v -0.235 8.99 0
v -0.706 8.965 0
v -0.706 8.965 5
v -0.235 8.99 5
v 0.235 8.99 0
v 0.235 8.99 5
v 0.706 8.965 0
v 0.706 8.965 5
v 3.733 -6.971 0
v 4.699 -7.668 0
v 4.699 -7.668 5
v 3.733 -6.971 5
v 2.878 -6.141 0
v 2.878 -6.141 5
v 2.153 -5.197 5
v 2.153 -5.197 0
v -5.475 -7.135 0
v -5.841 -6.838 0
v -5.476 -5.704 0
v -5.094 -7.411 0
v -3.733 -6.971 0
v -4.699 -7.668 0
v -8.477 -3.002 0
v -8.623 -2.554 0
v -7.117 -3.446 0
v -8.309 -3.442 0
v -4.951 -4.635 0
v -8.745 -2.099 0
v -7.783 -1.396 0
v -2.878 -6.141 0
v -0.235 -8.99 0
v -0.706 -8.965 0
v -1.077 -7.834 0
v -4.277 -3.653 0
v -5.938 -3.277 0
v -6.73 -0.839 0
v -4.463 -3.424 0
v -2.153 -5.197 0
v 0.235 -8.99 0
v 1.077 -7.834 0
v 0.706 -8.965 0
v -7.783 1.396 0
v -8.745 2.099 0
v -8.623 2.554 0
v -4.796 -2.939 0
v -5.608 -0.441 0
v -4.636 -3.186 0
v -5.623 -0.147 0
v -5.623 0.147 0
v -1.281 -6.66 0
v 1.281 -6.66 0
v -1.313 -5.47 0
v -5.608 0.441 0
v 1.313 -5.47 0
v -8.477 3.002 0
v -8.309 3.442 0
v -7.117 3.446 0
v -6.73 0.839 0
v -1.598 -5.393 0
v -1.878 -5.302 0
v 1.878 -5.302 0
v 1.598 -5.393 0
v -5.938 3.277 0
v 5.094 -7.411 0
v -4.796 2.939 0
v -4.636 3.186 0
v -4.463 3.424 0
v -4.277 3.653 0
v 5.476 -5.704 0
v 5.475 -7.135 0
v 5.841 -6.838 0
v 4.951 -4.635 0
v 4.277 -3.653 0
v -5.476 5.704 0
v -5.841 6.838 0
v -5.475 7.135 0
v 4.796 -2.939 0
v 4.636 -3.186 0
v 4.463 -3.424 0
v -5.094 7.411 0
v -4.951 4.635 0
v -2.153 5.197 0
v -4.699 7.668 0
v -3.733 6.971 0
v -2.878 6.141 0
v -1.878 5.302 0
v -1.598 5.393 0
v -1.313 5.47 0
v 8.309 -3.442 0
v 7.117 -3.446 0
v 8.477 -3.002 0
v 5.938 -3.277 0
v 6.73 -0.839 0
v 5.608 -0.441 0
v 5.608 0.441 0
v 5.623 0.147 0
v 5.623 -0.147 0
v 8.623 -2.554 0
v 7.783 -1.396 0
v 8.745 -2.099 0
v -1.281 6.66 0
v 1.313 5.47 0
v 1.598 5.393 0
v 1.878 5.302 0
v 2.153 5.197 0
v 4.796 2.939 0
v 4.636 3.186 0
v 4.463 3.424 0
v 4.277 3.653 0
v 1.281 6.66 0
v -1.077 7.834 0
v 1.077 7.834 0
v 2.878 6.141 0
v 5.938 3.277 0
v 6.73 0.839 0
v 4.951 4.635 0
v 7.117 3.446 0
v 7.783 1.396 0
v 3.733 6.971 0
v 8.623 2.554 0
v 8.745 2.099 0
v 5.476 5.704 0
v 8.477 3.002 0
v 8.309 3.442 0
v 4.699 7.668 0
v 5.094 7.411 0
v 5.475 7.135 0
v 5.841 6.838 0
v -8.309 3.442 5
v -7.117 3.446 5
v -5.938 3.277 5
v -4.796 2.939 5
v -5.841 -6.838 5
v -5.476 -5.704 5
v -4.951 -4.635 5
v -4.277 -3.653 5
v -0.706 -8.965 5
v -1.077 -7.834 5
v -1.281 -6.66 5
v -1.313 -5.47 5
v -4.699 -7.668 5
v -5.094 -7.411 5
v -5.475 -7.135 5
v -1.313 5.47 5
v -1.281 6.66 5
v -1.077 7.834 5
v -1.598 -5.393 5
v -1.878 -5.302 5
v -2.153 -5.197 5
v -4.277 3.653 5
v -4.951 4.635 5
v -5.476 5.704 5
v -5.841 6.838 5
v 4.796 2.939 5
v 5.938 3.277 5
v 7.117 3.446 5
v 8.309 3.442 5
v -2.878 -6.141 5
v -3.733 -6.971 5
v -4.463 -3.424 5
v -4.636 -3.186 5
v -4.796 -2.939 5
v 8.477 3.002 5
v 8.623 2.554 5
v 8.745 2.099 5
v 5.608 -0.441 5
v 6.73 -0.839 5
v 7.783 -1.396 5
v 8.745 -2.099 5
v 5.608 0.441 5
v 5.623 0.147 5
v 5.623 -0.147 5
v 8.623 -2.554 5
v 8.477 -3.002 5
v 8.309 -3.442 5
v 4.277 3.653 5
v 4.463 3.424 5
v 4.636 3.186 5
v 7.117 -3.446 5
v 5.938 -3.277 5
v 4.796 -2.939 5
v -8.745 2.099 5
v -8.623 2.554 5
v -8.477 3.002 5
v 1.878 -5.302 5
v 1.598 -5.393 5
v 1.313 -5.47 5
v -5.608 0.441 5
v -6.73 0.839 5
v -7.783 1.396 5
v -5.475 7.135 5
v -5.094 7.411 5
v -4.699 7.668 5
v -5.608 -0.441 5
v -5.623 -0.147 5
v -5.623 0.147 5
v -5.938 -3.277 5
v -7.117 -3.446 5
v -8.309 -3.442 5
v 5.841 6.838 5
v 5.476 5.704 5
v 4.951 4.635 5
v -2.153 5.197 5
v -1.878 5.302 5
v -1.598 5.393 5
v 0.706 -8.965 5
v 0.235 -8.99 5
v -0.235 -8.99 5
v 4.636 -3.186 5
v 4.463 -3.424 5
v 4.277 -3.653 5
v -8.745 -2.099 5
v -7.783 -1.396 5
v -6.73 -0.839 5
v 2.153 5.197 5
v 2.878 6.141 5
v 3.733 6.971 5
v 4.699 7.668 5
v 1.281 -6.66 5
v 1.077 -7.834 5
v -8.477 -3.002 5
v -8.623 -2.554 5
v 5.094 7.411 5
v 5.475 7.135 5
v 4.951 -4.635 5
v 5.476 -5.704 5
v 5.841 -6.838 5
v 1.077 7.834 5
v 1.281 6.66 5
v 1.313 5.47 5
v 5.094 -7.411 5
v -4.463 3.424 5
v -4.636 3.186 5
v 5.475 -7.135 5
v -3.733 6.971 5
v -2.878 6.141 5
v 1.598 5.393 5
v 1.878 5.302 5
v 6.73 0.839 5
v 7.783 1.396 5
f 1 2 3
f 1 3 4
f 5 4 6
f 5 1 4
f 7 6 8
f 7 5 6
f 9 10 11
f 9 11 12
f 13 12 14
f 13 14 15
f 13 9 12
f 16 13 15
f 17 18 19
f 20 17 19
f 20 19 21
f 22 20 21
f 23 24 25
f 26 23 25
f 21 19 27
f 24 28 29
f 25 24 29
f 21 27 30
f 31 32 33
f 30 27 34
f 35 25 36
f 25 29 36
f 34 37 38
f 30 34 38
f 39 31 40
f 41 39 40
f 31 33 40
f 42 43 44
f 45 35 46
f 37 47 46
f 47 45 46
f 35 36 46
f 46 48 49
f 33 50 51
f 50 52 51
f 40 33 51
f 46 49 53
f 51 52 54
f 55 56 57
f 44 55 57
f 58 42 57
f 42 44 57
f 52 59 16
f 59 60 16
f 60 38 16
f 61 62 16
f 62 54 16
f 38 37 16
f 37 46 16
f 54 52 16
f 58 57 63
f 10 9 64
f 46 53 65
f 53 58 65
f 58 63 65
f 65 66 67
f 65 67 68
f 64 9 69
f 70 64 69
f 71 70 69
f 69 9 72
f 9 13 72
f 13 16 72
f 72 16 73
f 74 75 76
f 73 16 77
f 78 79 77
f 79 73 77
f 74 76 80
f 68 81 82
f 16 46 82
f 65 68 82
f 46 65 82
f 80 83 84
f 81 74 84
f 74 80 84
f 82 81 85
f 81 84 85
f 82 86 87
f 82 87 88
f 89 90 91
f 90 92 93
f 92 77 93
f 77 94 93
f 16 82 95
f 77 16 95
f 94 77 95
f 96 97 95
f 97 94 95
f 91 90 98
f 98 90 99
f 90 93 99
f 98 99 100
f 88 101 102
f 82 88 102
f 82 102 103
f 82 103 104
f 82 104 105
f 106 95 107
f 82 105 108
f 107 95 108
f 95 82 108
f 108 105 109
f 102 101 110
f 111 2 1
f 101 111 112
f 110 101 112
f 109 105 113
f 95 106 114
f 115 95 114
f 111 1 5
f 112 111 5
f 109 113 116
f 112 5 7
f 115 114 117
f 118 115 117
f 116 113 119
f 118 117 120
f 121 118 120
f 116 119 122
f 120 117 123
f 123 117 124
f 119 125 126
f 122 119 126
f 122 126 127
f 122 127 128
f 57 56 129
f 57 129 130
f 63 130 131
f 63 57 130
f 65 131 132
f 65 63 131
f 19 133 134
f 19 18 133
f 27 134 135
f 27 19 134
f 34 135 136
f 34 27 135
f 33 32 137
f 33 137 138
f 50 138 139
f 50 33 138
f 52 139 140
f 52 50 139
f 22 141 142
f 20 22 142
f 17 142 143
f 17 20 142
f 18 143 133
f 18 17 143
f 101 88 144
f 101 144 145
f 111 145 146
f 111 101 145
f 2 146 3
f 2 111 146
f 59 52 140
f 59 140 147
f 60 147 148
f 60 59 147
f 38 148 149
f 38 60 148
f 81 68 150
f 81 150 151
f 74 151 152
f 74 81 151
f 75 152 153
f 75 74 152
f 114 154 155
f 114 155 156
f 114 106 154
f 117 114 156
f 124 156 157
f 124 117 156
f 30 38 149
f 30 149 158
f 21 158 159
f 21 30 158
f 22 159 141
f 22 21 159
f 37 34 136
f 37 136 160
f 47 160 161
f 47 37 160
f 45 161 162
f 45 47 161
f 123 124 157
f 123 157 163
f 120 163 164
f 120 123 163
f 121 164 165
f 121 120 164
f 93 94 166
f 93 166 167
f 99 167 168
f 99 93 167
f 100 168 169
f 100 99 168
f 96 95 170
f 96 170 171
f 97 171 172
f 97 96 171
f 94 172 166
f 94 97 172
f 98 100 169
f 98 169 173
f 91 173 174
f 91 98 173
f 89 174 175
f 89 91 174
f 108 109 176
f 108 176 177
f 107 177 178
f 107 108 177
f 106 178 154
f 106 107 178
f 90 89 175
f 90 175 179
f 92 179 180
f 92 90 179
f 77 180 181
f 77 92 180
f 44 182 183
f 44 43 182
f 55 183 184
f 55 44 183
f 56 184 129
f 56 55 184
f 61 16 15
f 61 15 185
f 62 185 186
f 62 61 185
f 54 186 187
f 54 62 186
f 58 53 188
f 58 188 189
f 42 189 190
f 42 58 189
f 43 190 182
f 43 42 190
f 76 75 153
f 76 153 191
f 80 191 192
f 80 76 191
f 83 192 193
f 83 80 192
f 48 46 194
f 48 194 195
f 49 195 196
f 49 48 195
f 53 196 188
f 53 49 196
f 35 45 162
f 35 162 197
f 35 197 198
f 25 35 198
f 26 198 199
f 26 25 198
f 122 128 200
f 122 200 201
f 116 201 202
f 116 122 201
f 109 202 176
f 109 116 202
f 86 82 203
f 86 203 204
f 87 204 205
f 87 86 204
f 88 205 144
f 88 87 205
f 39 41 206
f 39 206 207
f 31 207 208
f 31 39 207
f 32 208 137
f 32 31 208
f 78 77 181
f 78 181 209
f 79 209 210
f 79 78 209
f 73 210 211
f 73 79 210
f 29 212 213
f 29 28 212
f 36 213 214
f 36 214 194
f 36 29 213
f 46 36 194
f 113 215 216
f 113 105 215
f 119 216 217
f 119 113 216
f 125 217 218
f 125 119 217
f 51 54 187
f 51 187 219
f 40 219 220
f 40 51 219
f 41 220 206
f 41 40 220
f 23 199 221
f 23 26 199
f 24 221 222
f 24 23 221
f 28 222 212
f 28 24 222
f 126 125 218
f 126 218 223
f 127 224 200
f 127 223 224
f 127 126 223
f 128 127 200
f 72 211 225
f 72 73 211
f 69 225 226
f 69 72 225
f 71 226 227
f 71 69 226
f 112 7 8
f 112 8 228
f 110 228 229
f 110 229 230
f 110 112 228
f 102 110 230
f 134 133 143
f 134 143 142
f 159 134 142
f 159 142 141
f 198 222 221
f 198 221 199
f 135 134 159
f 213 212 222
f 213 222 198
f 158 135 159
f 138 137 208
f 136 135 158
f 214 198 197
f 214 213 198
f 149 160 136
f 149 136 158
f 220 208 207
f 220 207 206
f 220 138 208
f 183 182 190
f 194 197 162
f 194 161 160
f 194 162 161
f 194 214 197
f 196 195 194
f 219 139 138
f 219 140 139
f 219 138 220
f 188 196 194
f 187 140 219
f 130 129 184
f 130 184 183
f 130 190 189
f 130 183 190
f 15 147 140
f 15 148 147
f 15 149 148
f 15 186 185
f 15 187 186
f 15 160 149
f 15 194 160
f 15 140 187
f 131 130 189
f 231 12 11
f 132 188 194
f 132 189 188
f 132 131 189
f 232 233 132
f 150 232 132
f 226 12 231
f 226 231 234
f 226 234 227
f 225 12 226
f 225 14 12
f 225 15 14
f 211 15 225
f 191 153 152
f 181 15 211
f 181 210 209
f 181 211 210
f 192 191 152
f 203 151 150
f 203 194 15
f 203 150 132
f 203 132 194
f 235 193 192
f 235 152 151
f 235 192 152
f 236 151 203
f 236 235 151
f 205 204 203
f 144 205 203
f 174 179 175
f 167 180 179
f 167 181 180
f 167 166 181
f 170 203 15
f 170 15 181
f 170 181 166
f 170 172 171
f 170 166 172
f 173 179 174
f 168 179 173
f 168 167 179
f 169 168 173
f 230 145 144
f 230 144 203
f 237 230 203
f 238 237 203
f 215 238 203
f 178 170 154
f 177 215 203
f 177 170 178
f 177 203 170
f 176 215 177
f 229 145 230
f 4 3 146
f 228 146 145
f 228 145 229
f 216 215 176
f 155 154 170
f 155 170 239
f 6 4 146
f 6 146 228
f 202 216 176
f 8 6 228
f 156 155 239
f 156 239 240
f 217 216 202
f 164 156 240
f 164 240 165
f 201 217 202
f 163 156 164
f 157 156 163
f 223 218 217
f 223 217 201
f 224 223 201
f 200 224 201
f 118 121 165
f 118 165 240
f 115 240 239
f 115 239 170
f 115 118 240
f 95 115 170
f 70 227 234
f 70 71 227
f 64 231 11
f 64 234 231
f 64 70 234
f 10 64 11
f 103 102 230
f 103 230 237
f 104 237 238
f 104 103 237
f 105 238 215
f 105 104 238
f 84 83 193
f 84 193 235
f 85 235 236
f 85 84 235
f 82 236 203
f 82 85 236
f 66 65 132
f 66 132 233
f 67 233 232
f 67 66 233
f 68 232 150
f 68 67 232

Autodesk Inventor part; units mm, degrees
sketch "Sketch1" plane through (0, 0, 0) normal (0, 0, 1) x (1, 0, 0)
  circle A0 centre (0, 0) radius 8.9931
  dimension "d0" = 17.9863
extrude "Extrusion1" add sketch "Sketch1" along normal blind 5
ref_plane "Work Plane2" through (0, 0, 2.5) normal (0, 0, 1) x (1, 0, 0)
sketch "Sketch2" plane through (0, 0, 0) normal (0, 0, -1) x (-1, 0, 0)
  circle A0 centre (0, 0) radius 8.9931 projected
  circle A1 centre (0, 0) radius 7.5
  dimension "d3" = 15
surface extrude "Средний диаметр" sketch "Sketch2" against normal through all shown no curves A1
ref_plane "Work Plane8" through (0, 0, 0) normal (0.9510565, 0.309017, 0) x (0, 0, 1)
ref_plane "Work Plane9" through (0, 0, 0) normal (1, 0, 0) x (0, 1, 0)
spur gear teeth "Цилиндрическое зубчатое зацепление" teeth 10 pitch diameter 15 tip diameter 17.9863 root diameter 11.25 face width 5 start plane through (0, 0, 0) normal (0, 0, -1) x (-1, 0, 0)
equation "\"d0\" = da_da"
equation "\"d1\" = da_b"
equation "\"d3\" = da_d"
equation "\"d16\" = da_aw"
equation "\"d43\" = da_aw"
equation "\"d46\" = da_aw"
equation "\"da_da\" = 17.98627"
equation "\"da_b\" = 5"
equation "\"da_d\" = 15"
equation "\"da_aw\" = 38.516933"
properties part number "Цилиндрическое зубчатое зацепление1" material "Steel"
